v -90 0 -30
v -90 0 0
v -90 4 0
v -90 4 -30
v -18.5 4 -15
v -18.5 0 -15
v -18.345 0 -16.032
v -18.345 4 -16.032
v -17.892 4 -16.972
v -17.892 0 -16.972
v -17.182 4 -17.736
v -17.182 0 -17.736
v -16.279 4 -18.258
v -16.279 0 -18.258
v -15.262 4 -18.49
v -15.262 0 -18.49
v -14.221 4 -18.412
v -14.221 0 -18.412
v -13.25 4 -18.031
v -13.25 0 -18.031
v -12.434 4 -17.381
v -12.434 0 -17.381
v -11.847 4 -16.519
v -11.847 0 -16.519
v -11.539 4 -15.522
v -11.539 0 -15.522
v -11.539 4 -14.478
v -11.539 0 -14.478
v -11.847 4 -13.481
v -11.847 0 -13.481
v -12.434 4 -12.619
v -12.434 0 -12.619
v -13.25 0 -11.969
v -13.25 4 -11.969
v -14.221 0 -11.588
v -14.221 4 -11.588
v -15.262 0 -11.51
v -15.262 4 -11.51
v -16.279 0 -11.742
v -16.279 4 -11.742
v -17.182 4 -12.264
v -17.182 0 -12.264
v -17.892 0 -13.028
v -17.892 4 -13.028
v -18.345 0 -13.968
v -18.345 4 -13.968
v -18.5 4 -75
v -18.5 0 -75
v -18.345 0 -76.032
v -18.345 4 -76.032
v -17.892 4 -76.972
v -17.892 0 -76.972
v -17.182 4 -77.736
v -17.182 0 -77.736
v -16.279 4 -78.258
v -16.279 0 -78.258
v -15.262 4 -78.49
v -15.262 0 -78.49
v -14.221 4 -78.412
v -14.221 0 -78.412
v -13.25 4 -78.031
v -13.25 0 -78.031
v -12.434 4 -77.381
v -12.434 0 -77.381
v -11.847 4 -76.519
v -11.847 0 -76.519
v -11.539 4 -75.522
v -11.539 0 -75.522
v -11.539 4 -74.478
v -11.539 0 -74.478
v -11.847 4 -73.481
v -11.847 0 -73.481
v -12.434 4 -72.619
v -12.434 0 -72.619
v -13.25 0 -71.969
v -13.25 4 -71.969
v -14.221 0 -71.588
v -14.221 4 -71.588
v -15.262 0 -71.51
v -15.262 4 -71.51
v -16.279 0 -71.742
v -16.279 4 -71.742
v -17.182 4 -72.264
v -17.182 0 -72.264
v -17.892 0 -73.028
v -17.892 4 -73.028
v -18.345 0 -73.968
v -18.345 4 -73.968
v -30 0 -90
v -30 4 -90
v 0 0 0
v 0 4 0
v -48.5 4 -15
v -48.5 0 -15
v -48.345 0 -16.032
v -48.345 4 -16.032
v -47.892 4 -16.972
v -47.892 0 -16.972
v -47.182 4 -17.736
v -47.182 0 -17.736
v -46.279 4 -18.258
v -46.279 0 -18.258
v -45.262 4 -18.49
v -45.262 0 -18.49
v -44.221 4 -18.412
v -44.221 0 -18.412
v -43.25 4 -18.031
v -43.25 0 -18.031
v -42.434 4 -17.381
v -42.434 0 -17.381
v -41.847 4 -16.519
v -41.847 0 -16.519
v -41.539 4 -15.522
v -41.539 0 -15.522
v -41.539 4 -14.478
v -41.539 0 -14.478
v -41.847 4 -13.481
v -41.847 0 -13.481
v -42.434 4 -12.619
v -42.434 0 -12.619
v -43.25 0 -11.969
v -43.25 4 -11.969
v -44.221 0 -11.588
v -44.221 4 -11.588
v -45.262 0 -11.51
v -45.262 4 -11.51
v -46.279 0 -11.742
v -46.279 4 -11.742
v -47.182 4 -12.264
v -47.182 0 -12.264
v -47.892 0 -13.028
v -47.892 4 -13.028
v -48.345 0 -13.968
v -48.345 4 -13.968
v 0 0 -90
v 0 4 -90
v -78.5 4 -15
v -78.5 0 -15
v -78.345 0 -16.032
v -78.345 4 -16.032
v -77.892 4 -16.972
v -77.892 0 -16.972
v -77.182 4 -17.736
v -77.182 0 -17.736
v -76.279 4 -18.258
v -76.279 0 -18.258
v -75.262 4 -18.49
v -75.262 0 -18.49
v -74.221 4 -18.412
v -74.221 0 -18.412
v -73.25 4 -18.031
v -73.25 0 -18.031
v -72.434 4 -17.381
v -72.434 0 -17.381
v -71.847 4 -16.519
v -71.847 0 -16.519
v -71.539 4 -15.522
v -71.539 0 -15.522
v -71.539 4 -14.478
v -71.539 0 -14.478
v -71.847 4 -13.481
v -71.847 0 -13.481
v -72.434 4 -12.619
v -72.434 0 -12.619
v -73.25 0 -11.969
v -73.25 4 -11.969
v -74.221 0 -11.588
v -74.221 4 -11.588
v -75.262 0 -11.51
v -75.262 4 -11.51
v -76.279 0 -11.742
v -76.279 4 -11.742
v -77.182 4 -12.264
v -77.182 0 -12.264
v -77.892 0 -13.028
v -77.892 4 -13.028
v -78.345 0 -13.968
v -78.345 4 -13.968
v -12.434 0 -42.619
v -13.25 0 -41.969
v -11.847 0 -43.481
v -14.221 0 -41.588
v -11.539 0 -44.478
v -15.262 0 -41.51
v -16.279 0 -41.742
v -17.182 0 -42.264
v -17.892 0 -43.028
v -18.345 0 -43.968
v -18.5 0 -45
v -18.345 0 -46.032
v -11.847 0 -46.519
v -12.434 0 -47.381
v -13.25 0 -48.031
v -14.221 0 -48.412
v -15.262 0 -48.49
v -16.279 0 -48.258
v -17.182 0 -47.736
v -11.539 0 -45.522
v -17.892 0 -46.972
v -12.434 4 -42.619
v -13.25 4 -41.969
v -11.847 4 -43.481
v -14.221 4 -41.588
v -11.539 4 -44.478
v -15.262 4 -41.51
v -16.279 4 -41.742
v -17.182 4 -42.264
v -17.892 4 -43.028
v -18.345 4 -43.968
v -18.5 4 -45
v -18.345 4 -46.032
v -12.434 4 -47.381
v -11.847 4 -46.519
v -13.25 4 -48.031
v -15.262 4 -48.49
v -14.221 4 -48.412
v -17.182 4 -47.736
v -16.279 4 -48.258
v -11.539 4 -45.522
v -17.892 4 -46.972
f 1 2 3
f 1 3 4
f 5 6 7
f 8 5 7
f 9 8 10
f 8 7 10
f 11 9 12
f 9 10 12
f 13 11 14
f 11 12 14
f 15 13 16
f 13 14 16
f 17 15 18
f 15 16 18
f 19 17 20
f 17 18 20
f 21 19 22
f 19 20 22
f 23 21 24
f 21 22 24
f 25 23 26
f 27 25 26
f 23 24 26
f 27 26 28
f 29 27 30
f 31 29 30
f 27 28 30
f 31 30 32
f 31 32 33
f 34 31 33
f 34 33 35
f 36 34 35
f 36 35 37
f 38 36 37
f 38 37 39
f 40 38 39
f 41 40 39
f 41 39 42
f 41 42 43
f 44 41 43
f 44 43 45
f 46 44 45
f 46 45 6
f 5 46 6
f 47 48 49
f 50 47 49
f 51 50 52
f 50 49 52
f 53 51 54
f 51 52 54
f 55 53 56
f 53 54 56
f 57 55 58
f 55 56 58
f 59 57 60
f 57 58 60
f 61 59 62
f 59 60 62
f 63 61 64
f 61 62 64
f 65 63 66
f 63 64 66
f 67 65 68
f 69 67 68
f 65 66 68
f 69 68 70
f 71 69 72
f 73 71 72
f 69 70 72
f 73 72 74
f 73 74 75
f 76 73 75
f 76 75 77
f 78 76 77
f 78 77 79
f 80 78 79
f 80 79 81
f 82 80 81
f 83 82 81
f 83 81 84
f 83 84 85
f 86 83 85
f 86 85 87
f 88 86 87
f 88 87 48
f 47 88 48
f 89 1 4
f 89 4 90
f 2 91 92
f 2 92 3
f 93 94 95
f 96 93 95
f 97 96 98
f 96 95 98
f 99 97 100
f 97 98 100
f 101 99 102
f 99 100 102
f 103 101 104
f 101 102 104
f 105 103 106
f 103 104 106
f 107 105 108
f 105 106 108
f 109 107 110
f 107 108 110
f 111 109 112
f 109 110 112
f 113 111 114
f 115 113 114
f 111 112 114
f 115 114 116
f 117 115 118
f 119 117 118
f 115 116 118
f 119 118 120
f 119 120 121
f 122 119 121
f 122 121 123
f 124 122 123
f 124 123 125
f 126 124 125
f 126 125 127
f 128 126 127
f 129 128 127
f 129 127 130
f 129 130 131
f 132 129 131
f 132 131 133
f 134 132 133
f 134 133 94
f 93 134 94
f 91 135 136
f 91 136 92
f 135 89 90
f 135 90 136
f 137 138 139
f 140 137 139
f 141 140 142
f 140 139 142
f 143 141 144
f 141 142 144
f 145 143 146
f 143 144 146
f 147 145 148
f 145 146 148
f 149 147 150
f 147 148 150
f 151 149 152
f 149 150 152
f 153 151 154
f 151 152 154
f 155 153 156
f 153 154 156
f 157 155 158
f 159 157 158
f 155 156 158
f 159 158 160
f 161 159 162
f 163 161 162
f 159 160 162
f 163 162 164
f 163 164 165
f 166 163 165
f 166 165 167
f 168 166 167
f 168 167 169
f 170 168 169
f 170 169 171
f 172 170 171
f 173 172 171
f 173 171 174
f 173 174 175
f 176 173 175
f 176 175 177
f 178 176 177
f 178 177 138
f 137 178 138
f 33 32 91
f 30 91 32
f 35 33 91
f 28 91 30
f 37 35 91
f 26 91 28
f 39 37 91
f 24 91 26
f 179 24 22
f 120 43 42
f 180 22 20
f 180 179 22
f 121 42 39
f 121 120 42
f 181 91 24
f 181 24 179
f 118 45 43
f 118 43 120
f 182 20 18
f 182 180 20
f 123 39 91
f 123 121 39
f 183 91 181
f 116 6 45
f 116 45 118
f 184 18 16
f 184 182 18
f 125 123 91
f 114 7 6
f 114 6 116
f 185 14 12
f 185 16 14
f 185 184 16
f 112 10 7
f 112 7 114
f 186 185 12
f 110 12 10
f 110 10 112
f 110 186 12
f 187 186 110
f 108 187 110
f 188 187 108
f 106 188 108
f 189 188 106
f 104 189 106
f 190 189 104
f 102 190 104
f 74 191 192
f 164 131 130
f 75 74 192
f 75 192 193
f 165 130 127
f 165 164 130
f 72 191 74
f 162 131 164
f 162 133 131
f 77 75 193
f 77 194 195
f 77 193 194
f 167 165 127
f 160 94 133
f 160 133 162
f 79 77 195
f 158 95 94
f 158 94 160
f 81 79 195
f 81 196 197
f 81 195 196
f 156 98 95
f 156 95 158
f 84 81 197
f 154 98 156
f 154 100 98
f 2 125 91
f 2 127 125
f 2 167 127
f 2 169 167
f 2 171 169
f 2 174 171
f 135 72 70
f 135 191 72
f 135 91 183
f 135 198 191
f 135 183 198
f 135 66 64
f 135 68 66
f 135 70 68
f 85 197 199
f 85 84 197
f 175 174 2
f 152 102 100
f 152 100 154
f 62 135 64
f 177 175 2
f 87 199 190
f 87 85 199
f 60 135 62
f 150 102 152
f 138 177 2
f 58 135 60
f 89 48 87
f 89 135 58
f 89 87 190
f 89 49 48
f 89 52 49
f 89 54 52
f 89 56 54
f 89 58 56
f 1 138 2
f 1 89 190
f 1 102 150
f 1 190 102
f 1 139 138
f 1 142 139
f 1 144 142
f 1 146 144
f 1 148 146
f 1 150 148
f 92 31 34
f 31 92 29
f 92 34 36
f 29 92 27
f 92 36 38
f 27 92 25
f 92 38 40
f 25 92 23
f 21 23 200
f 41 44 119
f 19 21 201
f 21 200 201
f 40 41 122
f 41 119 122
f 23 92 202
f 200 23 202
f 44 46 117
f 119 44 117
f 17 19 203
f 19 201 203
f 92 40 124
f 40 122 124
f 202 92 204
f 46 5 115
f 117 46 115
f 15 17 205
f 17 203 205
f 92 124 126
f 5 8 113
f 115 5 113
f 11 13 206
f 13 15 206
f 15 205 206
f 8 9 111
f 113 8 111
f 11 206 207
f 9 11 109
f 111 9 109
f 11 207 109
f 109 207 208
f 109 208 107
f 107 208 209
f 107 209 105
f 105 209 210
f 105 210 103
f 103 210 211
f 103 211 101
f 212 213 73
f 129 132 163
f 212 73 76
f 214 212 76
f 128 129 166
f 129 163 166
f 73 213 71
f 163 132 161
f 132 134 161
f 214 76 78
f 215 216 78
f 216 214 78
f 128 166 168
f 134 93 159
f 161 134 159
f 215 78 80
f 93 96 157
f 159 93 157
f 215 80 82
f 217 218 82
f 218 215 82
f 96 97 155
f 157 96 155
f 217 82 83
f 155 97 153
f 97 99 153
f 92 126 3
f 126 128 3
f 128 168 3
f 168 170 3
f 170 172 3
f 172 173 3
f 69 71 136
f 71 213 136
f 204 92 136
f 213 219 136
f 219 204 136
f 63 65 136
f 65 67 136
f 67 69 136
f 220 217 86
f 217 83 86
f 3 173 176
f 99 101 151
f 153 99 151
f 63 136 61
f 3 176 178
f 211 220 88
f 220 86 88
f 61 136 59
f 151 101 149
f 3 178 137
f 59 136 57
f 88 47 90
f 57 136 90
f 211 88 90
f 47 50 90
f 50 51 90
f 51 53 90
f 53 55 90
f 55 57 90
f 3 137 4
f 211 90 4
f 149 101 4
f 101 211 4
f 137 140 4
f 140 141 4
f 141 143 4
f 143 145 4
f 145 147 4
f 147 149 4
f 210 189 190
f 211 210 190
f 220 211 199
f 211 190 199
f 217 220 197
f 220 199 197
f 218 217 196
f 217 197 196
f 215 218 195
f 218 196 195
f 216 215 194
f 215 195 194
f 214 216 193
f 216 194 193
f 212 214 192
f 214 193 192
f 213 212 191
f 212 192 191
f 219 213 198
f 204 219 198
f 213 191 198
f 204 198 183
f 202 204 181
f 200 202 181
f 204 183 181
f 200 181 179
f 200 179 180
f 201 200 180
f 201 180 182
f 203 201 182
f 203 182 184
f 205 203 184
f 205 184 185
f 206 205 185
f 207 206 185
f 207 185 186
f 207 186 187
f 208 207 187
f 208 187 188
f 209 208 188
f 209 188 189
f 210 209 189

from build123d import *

# Parameters (mm, degrees)
BOSS_EXTRUDE1_DEPTH  = 4
M6_CLEARANCE_HOLE1_D = 7


with BuildPart() as part:
    # Sketch1 → Boss-Extrude1 (new body)
    with BuildSketch(Plane(origin=(0, 0, 0), x_dir=(1, 0, 0), z_dir=(0, 1, 0))):
        Polygon((0, 0), (-90, 0), (-90, 30), (-30, 90), (0, 90), align=None)
    extrude(amount=BOSS_EXTRUDE1_DEPTH)

    # M6 Clearance Hole1 (through all)
    with Locations(Plane(origin=(0, 4, 0), x_dir=(1, 0, 0), z_dir=(0, 1, 0))):
        with Locations((-75, 15), (-45, 15), (-15, 15), (-15, 45), (-15, 75)):
            Hole(M6_CLEARANCE_HOLE1_D / 2)


solid = part.part
